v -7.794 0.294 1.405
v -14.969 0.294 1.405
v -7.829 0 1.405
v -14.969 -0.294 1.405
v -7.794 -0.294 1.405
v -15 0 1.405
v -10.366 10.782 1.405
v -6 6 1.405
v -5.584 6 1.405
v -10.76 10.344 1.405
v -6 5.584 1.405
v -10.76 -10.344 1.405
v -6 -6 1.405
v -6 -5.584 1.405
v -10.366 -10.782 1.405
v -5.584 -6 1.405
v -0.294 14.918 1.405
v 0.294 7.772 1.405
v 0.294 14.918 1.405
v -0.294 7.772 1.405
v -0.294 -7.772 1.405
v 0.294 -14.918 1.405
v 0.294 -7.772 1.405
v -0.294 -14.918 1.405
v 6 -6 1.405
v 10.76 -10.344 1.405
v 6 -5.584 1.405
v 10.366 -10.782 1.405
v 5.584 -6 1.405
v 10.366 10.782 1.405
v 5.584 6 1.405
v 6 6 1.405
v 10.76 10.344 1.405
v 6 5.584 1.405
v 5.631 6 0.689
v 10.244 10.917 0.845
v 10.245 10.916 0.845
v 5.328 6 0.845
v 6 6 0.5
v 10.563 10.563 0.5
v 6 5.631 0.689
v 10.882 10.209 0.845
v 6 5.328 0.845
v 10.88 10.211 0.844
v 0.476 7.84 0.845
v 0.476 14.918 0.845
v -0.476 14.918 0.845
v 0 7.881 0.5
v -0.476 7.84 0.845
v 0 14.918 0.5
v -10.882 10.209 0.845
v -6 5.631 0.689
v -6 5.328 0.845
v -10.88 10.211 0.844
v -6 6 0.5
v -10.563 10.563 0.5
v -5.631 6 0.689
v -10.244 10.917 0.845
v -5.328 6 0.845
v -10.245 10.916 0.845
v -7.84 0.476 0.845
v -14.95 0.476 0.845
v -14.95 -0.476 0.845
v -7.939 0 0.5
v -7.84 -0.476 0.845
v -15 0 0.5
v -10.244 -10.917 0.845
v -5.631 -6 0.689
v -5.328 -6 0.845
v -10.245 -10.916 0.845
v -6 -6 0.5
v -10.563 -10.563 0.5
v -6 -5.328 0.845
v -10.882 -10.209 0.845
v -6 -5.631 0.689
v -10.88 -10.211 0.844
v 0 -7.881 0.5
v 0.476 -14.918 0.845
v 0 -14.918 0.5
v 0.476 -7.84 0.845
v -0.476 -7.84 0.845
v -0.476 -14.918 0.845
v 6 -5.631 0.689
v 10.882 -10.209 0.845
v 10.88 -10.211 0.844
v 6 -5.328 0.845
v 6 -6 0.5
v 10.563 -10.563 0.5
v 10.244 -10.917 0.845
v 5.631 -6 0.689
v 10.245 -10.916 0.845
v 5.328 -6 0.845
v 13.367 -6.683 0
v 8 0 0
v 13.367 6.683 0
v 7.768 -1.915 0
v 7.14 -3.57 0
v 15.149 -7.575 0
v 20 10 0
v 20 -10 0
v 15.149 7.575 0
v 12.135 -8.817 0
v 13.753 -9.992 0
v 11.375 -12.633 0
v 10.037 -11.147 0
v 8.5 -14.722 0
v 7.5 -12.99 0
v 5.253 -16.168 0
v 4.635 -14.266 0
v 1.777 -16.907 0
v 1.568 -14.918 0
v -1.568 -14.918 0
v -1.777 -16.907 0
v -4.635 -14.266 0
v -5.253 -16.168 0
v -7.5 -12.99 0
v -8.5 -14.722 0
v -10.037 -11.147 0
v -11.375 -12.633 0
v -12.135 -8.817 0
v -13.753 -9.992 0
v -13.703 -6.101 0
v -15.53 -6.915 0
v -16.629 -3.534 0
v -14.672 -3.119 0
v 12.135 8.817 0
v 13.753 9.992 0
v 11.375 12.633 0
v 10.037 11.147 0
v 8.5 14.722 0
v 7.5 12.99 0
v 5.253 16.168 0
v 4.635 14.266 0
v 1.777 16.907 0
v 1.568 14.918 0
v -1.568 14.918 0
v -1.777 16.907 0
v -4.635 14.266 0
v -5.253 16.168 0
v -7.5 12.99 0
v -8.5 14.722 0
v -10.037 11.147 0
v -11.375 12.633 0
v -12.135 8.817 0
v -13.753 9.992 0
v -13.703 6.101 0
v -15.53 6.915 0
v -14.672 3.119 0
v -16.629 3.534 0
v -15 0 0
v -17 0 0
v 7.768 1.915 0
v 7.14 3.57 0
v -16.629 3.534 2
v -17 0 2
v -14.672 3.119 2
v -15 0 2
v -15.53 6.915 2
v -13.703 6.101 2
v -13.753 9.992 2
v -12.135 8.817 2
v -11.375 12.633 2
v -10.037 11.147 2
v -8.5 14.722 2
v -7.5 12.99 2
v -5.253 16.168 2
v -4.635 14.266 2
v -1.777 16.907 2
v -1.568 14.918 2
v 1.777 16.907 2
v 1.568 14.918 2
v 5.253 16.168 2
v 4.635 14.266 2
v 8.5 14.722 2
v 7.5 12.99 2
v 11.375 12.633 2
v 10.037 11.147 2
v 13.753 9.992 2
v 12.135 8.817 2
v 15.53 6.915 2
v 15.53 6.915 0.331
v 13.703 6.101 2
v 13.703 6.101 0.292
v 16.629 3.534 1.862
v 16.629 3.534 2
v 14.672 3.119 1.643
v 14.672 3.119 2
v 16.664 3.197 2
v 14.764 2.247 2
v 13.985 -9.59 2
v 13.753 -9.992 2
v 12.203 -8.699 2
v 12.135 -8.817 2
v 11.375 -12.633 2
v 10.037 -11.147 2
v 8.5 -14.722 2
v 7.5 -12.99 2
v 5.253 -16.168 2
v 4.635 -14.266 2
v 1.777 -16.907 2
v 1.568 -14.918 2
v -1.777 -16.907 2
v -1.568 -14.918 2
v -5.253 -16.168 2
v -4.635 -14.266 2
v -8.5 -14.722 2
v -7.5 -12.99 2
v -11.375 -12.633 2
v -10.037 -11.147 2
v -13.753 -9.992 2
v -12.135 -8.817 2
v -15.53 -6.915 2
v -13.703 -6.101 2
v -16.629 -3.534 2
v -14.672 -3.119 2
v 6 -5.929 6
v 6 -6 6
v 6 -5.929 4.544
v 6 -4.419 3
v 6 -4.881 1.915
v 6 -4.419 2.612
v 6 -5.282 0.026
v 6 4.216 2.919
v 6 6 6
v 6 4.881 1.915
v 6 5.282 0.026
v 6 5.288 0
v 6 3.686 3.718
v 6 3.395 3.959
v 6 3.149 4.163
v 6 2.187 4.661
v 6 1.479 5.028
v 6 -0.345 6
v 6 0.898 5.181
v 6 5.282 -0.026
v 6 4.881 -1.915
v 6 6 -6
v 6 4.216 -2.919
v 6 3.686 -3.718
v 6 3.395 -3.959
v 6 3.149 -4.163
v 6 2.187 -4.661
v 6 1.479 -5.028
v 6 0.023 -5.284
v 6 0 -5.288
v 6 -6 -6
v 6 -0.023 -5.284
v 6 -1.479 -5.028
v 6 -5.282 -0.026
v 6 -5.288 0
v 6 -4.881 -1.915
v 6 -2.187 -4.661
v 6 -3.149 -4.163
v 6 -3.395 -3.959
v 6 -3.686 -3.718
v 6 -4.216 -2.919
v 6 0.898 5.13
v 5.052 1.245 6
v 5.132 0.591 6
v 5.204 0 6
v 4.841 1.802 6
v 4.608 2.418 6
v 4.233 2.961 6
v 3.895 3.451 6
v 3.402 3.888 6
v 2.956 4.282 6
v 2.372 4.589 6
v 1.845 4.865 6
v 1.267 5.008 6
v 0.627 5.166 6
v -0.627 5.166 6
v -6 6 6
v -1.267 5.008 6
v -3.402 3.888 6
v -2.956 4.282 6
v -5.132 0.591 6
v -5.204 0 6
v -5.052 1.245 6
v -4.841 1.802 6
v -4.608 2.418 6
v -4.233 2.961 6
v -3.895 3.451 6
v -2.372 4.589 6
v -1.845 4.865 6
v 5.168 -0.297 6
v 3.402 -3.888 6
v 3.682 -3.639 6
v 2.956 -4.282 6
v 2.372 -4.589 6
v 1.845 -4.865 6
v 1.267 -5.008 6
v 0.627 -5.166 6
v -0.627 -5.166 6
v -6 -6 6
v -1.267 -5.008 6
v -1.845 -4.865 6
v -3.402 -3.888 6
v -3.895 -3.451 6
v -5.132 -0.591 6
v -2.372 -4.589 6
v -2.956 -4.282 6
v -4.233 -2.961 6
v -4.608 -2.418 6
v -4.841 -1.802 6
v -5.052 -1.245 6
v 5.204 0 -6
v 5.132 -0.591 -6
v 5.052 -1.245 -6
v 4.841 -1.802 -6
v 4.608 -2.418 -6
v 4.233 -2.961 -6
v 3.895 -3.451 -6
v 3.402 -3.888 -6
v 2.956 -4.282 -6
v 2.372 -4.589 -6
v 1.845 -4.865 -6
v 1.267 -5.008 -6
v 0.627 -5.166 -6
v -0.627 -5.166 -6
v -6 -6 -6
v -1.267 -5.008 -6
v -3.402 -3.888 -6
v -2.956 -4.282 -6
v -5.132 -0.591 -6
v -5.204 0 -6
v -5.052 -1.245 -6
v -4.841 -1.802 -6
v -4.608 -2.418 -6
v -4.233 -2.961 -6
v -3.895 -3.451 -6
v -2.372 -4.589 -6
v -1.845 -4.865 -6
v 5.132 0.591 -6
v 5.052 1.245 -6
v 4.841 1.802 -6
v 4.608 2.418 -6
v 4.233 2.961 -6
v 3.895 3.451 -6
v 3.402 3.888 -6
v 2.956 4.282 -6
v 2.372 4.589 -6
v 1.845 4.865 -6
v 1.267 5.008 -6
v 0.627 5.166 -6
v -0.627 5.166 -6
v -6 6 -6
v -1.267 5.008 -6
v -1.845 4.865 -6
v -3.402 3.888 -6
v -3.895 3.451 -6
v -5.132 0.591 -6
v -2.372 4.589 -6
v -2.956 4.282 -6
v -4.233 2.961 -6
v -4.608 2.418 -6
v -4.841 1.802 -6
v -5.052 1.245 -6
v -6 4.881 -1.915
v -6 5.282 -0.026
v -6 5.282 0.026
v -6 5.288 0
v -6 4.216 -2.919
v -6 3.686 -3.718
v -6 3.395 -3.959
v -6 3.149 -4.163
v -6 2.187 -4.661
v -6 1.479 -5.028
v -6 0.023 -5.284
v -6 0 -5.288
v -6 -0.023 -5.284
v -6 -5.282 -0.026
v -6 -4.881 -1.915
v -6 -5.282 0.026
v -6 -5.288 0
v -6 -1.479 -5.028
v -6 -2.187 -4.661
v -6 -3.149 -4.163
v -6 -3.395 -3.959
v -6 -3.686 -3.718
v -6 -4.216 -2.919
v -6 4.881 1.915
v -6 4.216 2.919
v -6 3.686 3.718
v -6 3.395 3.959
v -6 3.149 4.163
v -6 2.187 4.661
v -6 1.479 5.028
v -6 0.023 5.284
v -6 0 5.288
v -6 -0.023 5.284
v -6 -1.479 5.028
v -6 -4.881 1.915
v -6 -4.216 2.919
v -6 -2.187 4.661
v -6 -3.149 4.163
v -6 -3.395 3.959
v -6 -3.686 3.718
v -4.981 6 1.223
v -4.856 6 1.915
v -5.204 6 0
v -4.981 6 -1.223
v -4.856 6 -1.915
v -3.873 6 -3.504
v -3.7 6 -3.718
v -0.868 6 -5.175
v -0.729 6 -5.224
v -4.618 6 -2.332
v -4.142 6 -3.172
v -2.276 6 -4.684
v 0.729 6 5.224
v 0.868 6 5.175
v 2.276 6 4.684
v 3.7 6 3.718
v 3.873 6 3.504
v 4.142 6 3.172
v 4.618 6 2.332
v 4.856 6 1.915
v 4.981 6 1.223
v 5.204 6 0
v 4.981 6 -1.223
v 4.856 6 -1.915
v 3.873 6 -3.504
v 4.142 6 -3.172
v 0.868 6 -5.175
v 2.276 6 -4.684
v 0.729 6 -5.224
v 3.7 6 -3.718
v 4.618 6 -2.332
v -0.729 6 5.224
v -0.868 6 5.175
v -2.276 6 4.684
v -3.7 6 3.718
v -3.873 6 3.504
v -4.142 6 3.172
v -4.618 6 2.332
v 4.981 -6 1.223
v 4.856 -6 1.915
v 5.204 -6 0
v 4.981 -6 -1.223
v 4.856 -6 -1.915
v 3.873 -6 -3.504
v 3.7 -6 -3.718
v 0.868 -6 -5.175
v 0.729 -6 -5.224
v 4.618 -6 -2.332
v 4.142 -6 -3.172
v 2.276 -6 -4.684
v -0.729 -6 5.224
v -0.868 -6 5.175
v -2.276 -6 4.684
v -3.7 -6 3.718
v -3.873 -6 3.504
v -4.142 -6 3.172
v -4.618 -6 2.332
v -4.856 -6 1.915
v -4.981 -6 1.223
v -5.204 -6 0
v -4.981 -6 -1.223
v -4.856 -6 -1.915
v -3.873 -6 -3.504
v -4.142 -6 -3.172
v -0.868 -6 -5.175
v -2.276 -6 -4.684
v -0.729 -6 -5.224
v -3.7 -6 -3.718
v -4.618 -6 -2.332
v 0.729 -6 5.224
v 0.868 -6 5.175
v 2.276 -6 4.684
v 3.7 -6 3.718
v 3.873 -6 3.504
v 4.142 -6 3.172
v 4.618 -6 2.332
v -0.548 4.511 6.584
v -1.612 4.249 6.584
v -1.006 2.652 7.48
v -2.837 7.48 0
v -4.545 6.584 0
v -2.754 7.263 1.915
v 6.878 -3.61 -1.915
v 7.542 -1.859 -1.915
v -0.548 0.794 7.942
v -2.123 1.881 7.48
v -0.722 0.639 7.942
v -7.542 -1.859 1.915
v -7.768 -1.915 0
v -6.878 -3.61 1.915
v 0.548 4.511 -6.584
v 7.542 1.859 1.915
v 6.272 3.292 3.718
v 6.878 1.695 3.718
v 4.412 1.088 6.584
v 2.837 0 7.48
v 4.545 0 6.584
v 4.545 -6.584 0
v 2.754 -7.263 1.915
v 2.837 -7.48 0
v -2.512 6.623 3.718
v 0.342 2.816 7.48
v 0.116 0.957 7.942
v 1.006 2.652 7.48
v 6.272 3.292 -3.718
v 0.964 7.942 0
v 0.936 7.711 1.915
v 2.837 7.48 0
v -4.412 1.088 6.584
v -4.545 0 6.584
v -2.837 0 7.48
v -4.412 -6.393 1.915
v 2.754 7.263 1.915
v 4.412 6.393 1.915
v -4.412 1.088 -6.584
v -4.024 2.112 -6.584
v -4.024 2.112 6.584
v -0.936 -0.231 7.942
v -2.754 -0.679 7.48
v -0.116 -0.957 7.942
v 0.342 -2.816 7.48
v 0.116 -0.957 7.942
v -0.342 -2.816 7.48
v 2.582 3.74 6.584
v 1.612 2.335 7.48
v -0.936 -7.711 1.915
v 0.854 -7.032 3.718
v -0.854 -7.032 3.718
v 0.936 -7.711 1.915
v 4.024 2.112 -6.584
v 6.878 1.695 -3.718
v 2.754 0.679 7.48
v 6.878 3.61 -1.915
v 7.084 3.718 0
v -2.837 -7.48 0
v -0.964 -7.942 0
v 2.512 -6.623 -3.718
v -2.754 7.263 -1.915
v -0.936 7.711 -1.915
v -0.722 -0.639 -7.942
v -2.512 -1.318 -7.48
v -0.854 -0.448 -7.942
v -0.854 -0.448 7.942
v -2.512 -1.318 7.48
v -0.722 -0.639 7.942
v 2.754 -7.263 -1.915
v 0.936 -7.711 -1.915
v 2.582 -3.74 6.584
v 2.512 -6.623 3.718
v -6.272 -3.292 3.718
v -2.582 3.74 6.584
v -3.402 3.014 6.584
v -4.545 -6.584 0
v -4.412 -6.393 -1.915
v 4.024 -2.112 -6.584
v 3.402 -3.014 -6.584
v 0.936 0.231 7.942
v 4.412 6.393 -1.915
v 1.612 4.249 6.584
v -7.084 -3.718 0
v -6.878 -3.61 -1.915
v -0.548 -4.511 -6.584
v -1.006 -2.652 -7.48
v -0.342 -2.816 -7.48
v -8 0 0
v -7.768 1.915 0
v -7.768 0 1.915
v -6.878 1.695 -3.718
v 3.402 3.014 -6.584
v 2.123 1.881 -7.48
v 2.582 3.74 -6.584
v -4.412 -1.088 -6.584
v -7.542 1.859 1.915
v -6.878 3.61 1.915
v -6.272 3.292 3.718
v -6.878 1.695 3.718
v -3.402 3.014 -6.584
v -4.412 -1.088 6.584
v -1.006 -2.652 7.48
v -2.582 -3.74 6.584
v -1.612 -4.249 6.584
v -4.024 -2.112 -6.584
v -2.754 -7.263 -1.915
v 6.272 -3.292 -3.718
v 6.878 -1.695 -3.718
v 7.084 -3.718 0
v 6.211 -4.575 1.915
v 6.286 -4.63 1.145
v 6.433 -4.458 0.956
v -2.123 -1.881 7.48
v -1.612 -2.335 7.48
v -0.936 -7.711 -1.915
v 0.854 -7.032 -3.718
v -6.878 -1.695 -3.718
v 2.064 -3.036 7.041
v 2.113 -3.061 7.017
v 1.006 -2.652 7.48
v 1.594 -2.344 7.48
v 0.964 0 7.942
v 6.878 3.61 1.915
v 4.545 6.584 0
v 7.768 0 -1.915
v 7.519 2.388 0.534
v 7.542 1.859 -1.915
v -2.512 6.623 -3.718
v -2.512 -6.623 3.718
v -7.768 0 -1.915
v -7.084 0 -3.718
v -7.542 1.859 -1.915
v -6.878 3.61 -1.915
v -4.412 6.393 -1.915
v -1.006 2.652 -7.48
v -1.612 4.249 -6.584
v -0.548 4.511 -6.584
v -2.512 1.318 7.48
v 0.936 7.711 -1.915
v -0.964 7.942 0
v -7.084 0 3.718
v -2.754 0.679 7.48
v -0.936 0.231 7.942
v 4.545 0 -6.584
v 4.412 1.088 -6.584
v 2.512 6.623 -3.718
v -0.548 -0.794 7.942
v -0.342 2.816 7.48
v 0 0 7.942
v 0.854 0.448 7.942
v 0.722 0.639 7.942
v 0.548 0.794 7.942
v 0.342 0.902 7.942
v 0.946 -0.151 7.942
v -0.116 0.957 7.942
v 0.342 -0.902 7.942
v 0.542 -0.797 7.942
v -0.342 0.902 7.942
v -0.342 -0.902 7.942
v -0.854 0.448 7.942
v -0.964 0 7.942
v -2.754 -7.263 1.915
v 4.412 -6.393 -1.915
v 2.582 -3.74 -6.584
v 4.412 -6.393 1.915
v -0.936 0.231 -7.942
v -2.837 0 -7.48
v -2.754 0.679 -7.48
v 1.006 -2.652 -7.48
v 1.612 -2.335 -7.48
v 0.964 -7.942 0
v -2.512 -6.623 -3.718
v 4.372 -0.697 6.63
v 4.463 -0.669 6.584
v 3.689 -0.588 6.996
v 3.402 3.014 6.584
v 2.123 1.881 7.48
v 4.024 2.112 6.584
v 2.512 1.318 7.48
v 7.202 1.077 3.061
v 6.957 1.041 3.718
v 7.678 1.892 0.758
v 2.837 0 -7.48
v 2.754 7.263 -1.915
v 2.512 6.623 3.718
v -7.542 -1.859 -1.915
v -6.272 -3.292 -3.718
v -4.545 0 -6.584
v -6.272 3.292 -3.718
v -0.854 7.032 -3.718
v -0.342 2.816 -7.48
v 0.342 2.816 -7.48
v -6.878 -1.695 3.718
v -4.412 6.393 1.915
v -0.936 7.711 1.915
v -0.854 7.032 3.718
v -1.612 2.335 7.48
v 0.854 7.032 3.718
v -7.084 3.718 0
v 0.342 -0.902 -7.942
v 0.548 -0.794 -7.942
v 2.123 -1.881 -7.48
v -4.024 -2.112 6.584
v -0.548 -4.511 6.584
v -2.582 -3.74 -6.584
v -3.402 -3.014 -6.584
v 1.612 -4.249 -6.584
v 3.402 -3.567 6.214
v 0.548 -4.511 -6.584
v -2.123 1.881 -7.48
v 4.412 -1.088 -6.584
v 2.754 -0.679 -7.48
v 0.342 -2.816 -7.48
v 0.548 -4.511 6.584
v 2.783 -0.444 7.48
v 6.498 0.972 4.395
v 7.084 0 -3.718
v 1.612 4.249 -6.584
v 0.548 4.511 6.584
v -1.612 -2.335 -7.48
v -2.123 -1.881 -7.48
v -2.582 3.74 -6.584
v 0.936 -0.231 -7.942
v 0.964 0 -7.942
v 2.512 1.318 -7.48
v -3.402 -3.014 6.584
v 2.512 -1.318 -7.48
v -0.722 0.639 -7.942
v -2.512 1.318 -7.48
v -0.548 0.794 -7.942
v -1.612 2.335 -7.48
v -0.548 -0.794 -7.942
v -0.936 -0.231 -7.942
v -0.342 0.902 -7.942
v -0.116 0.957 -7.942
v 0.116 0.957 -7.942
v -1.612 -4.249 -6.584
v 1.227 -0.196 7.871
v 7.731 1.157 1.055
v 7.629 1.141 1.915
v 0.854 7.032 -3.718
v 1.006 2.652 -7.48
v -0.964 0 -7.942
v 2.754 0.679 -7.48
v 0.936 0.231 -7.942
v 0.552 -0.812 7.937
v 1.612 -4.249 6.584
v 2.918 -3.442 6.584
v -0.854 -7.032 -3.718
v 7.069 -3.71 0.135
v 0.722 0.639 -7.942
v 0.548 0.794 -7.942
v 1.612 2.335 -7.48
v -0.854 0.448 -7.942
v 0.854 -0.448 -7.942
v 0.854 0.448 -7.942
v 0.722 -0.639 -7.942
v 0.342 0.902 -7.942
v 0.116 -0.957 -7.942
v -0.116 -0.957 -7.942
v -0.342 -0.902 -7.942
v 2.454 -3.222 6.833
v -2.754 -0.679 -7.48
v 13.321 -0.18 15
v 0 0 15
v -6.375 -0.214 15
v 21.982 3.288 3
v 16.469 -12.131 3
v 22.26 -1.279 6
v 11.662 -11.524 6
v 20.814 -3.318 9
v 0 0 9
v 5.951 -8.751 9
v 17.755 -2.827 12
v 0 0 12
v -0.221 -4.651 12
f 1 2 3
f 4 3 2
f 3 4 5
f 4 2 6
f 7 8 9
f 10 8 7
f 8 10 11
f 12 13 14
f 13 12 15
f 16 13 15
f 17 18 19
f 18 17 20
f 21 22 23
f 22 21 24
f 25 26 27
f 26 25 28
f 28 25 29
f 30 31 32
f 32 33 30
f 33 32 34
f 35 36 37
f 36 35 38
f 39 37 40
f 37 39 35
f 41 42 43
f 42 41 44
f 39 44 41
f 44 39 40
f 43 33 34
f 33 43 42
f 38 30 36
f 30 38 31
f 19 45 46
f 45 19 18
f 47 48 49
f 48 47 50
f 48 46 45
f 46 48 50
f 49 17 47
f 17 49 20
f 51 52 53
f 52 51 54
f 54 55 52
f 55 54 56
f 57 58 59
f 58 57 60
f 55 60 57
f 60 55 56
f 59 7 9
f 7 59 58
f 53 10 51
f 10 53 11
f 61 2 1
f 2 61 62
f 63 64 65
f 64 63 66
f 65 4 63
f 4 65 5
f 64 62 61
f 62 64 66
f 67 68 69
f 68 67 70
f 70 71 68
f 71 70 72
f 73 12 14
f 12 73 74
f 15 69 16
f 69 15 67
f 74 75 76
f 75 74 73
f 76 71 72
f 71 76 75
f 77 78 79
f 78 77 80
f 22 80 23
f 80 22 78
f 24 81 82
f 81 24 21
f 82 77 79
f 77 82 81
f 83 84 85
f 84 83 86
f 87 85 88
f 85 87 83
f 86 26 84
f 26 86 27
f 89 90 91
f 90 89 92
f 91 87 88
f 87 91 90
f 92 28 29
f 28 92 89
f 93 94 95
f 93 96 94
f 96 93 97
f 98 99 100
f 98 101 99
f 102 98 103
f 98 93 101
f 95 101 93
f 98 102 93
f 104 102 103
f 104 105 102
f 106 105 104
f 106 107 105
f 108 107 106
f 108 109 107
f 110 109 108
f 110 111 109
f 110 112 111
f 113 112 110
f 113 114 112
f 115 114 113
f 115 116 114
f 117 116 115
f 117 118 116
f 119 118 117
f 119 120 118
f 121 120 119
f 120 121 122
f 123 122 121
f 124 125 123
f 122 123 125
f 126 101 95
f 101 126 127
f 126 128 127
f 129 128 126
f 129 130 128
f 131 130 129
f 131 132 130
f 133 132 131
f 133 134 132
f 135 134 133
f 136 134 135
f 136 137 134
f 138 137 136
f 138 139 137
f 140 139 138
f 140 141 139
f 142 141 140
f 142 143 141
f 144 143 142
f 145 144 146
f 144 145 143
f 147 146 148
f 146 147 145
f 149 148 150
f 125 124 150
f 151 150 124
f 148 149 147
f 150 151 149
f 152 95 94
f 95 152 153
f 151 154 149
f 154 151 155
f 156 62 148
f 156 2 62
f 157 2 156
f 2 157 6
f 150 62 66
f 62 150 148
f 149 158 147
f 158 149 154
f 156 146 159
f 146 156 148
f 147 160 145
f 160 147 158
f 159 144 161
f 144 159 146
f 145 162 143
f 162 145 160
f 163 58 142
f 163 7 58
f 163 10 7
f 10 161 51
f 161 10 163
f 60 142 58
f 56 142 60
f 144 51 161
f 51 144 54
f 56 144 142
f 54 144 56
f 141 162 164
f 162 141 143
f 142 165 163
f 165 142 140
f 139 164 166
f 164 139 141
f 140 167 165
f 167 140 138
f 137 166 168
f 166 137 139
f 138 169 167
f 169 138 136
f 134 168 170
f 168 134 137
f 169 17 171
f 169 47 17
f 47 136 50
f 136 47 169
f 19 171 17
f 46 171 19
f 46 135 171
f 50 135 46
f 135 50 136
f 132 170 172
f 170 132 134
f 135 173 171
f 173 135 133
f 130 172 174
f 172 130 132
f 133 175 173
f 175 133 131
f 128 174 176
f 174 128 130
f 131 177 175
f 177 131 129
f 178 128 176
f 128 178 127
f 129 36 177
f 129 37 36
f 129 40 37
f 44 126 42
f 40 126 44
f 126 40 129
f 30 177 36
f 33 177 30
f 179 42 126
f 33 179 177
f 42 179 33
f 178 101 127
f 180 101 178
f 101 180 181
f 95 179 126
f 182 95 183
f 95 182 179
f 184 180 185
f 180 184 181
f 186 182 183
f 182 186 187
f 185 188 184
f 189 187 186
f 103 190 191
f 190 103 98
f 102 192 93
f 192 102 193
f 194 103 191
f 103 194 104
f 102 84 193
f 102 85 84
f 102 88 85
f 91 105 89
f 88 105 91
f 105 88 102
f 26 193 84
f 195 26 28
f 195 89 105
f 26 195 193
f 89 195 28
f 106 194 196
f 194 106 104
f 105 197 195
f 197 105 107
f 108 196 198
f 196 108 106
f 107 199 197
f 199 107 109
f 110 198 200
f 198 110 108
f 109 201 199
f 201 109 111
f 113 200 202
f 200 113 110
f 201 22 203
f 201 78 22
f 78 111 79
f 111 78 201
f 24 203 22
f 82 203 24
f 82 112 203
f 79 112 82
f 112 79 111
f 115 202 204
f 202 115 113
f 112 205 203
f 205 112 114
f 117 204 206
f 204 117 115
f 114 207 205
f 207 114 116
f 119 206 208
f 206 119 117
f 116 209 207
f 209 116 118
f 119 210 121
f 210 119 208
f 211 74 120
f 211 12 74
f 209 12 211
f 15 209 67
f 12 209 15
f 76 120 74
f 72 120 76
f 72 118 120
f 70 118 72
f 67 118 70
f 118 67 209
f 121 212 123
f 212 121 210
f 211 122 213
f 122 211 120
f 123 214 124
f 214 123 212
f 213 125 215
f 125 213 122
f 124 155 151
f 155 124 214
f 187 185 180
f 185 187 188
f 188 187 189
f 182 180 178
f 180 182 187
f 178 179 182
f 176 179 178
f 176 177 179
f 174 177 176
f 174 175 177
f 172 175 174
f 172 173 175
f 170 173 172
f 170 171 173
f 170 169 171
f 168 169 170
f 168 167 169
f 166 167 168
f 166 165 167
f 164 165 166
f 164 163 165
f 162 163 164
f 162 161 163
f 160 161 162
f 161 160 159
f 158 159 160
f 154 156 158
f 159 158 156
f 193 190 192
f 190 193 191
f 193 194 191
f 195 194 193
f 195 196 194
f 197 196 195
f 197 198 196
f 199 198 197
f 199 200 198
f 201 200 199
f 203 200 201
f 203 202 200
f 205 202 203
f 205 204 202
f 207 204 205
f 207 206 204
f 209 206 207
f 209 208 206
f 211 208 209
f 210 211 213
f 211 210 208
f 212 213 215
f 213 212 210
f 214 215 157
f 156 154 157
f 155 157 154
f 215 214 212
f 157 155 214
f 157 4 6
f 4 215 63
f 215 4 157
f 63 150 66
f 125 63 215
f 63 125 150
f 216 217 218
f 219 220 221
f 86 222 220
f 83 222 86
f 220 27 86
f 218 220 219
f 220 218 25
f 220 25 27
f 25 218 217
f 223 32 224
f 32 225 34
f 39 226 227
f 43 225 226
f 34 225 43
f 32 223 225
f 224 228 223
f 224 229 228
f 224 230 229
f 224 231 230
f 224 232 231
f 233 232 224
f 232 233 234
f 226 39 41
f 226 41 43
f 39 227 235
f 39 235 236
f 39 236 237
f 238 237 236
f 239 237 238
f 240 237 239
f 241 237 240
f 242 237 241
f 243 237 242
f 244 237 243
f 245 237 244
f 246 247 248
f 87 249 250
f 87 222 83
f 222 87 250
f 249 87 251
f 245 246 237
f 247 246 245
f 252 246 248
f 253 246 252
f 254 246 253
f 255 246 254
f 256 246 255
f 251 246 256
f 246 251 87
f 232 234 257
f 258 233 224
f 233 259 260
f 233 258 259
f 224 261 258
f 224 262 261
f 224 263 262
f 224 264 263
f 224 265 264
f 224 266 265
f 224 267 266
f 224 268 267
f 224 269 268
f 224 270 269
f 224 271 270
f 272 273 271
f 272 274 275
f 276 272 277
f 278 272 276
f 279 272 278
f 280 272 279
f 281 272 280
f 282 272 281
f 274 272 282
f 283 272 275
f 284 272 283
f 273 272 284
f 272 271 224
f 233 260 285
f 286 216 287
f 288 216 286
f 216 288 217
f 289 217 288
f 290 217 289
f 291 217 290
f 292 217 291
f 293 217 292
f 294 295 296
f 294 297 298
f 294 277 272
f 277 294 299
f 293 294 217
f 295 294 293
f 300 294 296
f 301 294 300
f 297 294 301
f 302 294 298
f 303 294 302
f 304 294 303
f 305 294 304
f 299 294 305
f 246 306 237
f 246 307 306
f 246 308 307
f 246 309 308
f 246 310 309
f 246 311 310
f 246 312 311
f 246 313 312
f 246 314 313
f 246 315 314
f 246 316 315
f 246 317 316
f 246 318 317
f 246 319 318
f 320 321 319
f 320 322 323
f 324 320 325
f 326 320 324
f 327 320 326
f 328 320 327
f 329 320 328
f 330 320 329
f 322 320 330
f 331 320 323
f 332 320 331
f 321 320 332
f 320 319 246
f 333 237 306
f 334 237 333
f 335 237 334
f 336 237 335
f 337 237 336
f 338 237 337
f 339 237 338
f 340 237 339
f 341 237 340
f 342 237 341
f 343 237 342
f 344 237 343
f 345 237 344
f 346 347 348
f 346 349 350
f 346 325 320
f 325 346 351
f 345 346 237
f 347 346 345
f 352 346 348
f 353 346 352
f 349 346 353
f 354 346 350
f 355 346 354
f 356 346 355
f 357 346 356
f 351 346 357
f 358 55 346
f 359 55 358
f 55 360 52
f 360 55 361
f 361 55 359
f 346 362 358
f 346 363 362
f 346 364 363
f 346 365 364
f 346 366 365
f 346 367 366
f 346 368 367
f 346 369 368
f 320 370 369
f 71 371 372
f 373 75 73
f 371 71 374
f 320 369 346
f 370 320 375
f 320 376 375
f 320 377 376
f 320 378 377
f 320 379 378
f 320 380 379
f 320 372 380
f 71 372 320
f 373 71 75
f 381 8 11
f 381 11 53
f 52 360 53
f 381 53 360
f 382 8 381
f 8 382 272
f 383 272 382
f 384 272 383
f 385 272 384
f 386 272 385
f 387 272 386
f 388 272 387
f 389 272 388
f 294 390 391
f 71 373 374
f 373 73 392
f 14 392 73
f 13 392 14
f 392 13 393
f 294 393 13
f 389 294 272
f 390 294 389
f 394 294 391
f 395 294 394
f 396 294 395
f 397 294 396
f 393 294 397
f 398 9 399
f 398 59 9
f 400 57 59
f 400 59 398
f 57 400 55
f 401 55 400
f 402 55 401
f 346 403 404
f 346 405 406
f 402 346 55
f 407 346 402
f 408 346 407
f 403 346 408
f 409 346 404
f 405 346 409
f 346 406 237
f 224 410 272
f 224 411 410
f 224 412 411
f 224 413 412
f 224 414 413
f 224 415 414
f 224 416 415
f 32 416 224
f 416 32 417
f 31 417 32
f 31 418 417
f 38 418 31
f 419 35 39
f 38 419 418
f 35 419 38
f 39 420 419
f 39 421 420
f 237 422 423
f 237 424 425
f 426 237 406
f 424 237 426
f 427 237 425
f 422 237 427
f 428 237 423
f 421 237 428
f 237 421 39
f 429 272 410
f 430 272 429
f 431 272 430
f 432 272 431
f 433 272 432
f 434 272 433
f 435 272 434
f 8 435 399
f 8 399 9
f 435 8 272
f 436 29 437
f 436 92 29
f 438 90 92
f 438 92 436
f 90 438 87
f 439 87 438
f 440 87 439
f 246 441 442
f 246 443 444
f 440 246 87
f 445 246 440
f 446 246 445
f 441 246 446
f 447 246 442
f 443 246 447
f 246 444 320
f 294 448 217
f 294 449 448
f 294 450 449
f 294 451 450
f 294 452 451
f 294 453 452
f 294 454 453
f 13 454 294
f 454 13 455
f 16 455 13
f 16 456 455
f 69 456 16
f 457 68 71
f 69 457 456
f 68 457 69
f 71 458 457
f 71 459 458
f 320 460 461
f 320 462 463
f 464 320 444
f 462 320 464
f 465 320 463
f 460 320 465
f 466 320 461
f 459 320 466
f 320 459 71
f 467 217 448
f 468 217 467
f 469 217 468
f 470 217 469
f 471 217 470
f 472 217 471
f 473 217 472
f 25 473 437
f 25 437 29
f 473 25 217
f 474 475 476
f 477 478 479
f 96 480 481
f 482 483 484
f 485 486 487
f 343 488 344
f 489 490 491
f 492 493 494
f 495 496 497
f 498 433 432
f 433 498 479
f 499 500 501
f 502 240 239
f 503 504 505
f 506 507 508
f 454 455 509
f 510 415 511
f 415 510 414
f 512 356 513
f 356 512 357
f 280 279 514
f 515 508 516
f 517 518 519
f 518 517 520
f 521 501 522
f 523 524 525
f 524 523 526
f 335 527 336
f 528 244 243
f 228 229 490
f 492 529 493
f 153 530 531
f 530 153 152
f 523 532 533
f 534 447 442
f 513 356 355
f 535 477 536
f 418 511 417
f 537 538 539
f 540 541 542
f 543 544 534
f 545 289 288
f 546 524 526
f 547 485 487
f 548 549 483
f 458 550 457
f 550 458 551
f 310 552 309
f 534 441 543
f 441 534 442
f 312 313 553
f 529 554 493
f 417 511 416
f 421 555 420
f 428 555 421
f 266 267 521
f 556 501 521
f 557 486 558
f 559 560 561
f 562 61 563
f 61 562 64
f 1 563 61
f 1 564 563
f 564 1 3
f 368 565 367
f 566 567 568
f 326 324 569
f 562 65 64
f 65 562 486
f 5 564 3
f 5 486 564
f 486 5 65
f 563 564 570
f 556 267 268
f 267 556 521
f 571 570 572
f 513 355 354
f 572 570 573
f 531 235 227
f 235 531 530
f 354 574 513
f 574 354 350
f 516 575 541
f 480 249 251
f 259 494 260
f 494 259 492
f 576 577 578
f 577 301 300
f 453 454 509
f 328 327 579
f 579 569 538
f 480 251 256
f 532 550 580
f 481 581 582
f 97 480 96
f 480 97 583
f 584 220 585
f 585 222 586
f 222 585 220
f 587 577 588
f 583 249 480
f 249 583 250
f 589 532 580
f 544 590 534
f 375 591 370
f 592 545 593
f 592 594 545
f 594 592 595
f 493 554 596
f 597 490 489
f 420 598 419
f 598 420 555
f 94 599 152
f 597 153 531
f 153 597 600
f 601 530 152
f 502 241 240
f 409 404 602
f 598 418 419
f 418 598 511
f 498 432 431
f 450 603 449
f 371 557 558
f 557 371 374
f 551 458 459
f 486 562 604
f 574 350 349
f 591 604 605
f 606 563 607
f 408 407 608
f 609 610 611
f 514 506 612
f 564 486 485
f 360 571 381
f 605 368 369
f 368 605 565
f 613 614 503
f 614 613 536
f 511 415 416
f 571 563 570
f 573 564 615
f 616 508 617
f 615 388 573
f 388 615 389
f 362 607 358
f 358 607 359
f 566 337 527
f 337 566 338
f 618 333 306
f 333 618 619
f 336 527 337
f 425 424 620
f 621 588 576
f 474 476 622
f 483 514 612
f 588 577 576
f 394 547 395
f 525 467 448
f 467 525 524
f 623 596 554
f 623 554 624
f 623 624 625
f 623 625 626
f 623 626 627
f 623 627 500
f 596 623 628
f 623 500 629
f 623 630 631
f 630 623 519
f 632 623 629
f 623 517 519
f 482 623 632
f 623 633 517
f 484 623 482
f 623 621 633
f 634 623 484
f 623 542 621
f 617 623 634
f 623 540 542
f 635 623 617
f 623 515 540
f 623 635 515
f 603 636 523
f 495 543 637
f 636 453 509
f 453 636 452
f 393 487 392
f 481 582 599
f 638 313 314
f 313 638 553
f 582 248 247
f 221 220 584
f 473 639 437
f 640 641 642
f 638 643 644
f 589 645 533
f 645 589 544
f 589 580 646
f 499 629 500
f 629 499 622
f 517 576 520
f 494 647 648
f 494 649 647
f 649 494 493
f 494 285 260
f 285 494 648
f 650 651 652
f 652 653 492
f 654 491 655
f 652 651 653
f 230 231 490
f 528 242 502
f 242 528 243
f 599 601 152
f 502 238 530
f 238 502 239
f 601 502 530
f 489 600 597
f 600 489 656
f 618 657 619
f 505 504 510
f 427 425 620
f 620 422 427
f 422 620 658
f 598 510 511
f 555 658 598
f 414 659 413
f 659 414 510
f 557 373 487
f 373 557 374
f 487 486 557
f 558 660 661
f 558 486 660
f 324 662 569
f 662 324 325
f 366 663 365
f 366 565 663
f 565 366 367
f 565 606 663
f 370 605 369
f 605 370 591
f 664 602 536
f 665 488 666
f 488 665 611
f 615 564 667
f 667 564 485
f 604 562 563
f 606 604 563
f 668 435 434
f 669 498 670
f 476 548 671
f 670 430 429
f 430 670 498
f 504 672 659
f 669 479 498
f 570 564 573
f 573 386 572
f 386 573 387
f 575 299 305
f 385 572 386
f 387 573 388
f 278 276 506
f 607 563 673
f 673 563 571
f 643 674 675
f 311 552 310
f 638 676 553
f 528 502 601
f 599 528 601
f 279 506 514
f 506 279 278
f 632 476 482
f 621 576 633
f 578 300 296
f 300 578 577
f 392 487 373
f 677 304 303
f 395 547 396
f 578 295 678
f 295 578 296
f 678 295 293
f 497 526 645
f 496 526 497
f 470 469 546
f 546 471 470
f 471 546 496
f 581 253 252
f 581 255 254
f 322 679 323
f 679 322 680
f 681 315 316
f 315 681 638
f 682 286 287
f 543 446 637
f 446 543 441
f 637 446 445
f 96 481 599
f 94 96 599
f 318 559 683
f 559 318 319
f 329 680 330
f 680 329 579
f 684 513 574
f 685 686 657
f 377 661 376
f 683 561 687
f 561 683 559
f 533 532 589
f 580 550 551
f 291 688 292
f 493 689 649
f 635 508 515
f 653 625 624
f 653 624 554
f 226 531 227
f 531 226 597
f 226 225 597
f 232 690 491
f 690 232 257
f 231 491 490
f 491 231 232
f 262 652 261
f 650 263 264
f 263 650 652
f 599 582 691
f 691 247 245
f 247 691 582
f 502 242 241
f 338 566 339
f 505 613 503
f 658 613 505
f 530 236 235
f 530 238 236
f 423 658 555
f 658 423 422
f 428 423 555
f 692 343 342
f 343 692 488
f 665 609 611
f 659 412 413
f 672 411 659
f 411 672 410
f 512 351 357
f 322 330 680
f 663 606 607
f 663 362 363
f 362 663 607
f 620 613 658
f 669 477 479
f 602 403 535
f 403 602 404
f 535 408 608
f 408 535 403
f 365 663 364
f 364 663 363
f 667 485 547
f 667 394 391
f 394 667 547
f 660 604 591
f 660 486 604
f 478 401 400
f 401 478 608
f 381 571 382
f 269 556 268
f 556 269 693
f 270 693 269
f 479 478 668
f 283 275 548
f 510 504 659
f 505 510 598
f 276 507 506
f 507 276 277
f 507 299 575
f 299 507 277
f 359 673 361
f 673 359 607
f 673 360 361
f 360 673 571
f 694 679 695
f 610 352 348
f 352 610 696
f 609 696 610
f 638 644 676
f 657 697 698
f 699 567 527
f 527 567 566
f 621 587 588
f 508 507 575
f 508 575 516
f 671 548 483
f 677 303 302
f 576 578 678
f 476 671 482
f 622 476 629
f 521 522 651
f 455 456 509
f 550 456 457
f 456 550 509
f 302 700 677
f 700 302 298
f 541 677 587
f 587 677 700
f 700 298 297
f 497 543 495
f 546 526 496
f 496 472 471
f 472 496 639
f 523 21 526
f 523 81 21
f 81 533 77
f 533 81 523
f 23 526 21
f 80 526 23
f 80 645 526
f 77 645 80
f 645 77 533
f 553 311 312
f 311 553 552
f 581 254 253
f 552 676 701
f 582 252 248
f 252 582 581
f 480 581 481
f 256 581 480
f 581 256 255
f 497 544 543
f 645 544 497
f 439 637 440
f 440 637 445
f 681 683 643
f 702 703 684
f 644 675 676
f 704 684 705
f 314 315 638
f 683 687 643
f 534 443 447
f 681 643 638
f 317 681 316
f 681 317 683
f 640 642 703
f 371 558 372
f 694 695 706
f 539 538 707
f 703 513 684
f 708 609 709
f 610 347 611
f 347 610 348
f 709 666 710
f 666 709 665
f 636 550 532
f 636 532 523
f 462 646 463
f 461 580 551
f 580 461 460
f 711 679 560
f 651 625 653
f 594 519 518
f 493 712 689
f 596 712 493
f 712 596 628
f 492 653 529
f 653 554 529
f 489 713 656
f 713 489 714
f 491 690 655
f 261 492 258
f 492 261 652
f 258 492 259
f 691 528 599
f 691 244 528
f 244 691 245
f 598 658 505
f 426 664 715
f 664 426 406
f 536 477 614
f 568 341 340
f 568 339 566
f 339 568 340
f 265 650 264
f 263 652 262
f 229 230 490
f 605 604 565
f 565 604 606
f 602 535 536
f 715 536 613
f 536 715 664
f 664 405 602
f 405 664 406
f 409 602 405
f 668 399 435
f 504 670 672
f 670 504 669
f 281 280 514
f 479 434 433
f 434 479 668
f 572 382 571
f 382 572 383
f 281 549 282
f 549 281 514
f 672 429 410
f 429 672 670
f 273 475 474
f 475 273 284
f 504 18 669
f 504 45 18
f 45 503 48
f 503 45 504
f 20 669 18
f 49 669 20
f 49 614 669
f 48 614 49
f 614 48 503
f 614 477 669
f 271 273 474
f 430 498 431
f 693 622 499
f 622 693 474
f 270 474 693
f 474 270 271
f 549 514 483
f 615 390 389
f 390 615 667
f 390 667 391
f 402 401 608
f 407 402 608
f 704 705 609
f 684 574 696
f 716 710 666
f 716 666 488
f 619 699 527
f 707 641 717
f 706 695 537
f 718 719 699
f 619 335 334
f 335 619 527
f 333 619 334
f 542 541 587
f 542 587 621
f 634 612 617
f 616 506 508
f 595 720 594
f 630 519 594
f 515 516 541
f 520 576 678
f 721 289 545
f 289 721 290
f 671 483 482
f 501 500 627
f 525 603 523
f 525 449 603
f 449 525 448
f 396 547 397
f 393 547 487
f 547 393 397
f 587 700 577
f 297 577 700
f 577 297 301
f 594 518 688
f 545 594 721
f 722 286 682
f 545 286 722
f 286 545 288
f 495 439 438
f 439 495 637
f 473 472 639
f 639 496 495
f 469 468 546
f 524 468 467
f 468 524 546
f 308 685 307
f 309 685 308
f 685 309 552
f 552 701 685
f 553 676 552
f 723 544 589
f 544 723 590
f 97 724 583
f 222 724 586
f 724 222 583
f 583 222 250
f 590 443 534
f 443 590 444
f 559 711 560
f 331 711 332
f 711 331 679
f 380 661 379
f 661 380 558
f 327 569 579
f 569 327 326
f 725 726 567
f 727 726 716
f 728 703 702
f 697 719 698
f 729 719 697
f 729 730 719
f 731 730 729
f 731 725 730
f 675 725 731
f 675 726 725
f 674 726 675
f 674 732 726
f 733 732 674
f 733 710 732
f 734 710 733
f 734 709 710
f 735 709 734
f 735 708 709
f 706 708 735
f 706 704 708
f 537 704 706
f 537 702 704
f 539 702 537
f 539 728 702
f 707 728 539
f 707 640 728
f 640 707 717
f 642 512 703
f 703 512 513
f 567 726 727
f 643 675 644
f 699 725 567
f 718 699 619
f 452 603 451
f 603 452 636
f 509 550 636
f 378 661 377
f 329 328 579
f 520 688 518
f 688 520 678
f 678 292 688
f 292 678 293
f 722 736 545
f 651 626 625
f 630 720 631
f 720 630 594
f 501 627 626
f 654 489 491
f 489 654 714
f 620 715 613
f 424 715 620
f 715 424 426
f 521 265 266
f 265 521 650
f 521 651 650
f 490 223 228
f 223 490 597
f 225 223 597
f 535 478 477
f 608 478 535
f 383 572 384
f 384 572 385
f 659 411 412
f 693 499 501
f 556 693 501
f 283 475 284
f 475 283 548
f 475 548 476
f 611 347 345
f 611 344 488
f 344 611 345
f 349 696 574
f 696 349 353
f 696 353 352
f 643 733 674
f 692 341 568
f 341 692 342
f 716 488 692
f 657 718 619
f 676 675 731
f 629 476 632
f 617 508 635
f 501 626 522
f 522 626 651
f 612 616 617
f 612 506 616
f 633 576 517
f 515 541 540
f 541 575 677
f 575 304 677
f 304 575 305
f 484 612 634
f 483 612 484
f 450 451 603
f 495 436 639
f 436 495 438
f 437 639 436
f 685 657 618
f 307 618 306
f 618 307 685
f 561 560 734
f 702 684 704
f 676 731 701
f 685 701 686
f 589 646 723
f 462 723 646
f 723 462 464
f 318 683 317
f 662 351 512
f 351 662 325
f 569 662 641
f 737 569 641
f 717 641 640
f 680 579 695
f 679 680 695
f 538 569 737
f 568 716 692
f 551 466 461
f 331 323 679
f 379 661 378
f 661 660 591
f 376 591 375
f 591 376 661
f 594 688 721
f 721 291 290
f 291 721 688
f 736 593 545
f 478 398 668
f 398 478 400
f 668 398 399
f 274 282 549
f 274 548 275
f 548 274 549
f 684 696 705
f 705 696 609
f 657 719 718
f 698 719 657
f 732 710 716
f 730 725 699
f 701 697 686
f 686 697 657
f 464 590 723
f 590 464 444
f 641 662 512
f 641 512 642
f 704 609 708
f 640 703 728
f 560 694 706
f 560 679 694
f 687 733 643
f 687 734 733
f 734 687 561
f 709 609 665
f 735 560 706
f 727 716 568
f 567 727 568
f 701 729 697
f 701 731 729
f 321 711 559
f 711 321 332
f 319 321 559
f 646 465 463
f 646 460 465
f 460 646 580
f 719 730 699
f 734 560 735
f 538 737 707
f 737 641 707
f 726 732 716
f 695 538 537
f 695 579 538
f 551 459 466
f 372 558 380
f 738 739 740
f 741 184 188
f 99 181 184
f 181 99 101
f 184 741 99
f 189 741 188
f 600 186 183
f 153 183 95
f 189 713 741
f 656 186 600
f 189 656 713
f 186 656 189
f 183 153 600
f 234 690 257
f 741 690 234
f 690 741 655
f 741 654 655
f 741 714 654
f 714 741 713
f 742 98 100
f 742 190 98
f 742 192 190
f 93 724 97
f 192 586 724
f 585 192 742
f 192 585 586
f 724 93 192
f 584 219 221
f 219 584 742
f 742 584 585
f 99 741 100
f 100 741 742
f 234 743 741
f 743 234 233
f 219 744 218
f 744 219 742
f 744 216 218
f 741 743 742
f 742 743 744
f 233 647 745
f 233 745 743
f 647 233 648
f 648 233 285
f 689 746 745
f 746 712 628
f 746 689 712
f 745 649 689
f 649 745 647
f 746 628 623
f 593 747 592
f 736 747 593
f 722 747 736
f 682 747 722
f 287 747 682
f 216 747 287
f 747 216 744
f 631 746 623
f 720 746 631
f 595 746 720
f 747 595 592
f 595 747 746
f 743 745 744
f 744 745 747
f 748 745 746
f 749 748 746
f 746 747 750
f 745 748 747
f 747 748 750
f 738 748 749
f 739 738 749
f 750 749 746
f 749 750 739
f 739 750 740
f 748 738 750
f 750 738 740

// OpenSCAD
linear_extrude(height=15, scale=[1,0.01], slices=5, twist=80)

polygon(points=[[0,0], [20,10], [20, -10]]);

rotate_extrude(angle=360, convexity=10, $fn=200)
polygon(points=[[0,0], [2,1], [1, 2], [1,3], [3,4], [0,5]]);
//square(5);

variavel=15; //raio da roda;
module roda() {
    rotate_extrude(angle=360) {
        //Linha externa:
        translate([variavel, 0,0])
        square(2);
    }
    
    //Aros da roda:
    translate([0,0,1])
    for(i=[0:45:360]) {
        rotate([0,90,i])
        cylinder(variavel, .5,.5);
    }
}

roda();

//OPERAÇÕES BOLEANAS:
//union()
{square(10); circle(10);}

//difference()
{square(10); circle(10);}

//intersection()
{square(10); circle(10);}

//3D
union(){cube(12, center=true); sphere(8);}
difference(){cube(12, center=true); sphere(8);}
intersection(){cube(12, center=true); sphere(8);}
